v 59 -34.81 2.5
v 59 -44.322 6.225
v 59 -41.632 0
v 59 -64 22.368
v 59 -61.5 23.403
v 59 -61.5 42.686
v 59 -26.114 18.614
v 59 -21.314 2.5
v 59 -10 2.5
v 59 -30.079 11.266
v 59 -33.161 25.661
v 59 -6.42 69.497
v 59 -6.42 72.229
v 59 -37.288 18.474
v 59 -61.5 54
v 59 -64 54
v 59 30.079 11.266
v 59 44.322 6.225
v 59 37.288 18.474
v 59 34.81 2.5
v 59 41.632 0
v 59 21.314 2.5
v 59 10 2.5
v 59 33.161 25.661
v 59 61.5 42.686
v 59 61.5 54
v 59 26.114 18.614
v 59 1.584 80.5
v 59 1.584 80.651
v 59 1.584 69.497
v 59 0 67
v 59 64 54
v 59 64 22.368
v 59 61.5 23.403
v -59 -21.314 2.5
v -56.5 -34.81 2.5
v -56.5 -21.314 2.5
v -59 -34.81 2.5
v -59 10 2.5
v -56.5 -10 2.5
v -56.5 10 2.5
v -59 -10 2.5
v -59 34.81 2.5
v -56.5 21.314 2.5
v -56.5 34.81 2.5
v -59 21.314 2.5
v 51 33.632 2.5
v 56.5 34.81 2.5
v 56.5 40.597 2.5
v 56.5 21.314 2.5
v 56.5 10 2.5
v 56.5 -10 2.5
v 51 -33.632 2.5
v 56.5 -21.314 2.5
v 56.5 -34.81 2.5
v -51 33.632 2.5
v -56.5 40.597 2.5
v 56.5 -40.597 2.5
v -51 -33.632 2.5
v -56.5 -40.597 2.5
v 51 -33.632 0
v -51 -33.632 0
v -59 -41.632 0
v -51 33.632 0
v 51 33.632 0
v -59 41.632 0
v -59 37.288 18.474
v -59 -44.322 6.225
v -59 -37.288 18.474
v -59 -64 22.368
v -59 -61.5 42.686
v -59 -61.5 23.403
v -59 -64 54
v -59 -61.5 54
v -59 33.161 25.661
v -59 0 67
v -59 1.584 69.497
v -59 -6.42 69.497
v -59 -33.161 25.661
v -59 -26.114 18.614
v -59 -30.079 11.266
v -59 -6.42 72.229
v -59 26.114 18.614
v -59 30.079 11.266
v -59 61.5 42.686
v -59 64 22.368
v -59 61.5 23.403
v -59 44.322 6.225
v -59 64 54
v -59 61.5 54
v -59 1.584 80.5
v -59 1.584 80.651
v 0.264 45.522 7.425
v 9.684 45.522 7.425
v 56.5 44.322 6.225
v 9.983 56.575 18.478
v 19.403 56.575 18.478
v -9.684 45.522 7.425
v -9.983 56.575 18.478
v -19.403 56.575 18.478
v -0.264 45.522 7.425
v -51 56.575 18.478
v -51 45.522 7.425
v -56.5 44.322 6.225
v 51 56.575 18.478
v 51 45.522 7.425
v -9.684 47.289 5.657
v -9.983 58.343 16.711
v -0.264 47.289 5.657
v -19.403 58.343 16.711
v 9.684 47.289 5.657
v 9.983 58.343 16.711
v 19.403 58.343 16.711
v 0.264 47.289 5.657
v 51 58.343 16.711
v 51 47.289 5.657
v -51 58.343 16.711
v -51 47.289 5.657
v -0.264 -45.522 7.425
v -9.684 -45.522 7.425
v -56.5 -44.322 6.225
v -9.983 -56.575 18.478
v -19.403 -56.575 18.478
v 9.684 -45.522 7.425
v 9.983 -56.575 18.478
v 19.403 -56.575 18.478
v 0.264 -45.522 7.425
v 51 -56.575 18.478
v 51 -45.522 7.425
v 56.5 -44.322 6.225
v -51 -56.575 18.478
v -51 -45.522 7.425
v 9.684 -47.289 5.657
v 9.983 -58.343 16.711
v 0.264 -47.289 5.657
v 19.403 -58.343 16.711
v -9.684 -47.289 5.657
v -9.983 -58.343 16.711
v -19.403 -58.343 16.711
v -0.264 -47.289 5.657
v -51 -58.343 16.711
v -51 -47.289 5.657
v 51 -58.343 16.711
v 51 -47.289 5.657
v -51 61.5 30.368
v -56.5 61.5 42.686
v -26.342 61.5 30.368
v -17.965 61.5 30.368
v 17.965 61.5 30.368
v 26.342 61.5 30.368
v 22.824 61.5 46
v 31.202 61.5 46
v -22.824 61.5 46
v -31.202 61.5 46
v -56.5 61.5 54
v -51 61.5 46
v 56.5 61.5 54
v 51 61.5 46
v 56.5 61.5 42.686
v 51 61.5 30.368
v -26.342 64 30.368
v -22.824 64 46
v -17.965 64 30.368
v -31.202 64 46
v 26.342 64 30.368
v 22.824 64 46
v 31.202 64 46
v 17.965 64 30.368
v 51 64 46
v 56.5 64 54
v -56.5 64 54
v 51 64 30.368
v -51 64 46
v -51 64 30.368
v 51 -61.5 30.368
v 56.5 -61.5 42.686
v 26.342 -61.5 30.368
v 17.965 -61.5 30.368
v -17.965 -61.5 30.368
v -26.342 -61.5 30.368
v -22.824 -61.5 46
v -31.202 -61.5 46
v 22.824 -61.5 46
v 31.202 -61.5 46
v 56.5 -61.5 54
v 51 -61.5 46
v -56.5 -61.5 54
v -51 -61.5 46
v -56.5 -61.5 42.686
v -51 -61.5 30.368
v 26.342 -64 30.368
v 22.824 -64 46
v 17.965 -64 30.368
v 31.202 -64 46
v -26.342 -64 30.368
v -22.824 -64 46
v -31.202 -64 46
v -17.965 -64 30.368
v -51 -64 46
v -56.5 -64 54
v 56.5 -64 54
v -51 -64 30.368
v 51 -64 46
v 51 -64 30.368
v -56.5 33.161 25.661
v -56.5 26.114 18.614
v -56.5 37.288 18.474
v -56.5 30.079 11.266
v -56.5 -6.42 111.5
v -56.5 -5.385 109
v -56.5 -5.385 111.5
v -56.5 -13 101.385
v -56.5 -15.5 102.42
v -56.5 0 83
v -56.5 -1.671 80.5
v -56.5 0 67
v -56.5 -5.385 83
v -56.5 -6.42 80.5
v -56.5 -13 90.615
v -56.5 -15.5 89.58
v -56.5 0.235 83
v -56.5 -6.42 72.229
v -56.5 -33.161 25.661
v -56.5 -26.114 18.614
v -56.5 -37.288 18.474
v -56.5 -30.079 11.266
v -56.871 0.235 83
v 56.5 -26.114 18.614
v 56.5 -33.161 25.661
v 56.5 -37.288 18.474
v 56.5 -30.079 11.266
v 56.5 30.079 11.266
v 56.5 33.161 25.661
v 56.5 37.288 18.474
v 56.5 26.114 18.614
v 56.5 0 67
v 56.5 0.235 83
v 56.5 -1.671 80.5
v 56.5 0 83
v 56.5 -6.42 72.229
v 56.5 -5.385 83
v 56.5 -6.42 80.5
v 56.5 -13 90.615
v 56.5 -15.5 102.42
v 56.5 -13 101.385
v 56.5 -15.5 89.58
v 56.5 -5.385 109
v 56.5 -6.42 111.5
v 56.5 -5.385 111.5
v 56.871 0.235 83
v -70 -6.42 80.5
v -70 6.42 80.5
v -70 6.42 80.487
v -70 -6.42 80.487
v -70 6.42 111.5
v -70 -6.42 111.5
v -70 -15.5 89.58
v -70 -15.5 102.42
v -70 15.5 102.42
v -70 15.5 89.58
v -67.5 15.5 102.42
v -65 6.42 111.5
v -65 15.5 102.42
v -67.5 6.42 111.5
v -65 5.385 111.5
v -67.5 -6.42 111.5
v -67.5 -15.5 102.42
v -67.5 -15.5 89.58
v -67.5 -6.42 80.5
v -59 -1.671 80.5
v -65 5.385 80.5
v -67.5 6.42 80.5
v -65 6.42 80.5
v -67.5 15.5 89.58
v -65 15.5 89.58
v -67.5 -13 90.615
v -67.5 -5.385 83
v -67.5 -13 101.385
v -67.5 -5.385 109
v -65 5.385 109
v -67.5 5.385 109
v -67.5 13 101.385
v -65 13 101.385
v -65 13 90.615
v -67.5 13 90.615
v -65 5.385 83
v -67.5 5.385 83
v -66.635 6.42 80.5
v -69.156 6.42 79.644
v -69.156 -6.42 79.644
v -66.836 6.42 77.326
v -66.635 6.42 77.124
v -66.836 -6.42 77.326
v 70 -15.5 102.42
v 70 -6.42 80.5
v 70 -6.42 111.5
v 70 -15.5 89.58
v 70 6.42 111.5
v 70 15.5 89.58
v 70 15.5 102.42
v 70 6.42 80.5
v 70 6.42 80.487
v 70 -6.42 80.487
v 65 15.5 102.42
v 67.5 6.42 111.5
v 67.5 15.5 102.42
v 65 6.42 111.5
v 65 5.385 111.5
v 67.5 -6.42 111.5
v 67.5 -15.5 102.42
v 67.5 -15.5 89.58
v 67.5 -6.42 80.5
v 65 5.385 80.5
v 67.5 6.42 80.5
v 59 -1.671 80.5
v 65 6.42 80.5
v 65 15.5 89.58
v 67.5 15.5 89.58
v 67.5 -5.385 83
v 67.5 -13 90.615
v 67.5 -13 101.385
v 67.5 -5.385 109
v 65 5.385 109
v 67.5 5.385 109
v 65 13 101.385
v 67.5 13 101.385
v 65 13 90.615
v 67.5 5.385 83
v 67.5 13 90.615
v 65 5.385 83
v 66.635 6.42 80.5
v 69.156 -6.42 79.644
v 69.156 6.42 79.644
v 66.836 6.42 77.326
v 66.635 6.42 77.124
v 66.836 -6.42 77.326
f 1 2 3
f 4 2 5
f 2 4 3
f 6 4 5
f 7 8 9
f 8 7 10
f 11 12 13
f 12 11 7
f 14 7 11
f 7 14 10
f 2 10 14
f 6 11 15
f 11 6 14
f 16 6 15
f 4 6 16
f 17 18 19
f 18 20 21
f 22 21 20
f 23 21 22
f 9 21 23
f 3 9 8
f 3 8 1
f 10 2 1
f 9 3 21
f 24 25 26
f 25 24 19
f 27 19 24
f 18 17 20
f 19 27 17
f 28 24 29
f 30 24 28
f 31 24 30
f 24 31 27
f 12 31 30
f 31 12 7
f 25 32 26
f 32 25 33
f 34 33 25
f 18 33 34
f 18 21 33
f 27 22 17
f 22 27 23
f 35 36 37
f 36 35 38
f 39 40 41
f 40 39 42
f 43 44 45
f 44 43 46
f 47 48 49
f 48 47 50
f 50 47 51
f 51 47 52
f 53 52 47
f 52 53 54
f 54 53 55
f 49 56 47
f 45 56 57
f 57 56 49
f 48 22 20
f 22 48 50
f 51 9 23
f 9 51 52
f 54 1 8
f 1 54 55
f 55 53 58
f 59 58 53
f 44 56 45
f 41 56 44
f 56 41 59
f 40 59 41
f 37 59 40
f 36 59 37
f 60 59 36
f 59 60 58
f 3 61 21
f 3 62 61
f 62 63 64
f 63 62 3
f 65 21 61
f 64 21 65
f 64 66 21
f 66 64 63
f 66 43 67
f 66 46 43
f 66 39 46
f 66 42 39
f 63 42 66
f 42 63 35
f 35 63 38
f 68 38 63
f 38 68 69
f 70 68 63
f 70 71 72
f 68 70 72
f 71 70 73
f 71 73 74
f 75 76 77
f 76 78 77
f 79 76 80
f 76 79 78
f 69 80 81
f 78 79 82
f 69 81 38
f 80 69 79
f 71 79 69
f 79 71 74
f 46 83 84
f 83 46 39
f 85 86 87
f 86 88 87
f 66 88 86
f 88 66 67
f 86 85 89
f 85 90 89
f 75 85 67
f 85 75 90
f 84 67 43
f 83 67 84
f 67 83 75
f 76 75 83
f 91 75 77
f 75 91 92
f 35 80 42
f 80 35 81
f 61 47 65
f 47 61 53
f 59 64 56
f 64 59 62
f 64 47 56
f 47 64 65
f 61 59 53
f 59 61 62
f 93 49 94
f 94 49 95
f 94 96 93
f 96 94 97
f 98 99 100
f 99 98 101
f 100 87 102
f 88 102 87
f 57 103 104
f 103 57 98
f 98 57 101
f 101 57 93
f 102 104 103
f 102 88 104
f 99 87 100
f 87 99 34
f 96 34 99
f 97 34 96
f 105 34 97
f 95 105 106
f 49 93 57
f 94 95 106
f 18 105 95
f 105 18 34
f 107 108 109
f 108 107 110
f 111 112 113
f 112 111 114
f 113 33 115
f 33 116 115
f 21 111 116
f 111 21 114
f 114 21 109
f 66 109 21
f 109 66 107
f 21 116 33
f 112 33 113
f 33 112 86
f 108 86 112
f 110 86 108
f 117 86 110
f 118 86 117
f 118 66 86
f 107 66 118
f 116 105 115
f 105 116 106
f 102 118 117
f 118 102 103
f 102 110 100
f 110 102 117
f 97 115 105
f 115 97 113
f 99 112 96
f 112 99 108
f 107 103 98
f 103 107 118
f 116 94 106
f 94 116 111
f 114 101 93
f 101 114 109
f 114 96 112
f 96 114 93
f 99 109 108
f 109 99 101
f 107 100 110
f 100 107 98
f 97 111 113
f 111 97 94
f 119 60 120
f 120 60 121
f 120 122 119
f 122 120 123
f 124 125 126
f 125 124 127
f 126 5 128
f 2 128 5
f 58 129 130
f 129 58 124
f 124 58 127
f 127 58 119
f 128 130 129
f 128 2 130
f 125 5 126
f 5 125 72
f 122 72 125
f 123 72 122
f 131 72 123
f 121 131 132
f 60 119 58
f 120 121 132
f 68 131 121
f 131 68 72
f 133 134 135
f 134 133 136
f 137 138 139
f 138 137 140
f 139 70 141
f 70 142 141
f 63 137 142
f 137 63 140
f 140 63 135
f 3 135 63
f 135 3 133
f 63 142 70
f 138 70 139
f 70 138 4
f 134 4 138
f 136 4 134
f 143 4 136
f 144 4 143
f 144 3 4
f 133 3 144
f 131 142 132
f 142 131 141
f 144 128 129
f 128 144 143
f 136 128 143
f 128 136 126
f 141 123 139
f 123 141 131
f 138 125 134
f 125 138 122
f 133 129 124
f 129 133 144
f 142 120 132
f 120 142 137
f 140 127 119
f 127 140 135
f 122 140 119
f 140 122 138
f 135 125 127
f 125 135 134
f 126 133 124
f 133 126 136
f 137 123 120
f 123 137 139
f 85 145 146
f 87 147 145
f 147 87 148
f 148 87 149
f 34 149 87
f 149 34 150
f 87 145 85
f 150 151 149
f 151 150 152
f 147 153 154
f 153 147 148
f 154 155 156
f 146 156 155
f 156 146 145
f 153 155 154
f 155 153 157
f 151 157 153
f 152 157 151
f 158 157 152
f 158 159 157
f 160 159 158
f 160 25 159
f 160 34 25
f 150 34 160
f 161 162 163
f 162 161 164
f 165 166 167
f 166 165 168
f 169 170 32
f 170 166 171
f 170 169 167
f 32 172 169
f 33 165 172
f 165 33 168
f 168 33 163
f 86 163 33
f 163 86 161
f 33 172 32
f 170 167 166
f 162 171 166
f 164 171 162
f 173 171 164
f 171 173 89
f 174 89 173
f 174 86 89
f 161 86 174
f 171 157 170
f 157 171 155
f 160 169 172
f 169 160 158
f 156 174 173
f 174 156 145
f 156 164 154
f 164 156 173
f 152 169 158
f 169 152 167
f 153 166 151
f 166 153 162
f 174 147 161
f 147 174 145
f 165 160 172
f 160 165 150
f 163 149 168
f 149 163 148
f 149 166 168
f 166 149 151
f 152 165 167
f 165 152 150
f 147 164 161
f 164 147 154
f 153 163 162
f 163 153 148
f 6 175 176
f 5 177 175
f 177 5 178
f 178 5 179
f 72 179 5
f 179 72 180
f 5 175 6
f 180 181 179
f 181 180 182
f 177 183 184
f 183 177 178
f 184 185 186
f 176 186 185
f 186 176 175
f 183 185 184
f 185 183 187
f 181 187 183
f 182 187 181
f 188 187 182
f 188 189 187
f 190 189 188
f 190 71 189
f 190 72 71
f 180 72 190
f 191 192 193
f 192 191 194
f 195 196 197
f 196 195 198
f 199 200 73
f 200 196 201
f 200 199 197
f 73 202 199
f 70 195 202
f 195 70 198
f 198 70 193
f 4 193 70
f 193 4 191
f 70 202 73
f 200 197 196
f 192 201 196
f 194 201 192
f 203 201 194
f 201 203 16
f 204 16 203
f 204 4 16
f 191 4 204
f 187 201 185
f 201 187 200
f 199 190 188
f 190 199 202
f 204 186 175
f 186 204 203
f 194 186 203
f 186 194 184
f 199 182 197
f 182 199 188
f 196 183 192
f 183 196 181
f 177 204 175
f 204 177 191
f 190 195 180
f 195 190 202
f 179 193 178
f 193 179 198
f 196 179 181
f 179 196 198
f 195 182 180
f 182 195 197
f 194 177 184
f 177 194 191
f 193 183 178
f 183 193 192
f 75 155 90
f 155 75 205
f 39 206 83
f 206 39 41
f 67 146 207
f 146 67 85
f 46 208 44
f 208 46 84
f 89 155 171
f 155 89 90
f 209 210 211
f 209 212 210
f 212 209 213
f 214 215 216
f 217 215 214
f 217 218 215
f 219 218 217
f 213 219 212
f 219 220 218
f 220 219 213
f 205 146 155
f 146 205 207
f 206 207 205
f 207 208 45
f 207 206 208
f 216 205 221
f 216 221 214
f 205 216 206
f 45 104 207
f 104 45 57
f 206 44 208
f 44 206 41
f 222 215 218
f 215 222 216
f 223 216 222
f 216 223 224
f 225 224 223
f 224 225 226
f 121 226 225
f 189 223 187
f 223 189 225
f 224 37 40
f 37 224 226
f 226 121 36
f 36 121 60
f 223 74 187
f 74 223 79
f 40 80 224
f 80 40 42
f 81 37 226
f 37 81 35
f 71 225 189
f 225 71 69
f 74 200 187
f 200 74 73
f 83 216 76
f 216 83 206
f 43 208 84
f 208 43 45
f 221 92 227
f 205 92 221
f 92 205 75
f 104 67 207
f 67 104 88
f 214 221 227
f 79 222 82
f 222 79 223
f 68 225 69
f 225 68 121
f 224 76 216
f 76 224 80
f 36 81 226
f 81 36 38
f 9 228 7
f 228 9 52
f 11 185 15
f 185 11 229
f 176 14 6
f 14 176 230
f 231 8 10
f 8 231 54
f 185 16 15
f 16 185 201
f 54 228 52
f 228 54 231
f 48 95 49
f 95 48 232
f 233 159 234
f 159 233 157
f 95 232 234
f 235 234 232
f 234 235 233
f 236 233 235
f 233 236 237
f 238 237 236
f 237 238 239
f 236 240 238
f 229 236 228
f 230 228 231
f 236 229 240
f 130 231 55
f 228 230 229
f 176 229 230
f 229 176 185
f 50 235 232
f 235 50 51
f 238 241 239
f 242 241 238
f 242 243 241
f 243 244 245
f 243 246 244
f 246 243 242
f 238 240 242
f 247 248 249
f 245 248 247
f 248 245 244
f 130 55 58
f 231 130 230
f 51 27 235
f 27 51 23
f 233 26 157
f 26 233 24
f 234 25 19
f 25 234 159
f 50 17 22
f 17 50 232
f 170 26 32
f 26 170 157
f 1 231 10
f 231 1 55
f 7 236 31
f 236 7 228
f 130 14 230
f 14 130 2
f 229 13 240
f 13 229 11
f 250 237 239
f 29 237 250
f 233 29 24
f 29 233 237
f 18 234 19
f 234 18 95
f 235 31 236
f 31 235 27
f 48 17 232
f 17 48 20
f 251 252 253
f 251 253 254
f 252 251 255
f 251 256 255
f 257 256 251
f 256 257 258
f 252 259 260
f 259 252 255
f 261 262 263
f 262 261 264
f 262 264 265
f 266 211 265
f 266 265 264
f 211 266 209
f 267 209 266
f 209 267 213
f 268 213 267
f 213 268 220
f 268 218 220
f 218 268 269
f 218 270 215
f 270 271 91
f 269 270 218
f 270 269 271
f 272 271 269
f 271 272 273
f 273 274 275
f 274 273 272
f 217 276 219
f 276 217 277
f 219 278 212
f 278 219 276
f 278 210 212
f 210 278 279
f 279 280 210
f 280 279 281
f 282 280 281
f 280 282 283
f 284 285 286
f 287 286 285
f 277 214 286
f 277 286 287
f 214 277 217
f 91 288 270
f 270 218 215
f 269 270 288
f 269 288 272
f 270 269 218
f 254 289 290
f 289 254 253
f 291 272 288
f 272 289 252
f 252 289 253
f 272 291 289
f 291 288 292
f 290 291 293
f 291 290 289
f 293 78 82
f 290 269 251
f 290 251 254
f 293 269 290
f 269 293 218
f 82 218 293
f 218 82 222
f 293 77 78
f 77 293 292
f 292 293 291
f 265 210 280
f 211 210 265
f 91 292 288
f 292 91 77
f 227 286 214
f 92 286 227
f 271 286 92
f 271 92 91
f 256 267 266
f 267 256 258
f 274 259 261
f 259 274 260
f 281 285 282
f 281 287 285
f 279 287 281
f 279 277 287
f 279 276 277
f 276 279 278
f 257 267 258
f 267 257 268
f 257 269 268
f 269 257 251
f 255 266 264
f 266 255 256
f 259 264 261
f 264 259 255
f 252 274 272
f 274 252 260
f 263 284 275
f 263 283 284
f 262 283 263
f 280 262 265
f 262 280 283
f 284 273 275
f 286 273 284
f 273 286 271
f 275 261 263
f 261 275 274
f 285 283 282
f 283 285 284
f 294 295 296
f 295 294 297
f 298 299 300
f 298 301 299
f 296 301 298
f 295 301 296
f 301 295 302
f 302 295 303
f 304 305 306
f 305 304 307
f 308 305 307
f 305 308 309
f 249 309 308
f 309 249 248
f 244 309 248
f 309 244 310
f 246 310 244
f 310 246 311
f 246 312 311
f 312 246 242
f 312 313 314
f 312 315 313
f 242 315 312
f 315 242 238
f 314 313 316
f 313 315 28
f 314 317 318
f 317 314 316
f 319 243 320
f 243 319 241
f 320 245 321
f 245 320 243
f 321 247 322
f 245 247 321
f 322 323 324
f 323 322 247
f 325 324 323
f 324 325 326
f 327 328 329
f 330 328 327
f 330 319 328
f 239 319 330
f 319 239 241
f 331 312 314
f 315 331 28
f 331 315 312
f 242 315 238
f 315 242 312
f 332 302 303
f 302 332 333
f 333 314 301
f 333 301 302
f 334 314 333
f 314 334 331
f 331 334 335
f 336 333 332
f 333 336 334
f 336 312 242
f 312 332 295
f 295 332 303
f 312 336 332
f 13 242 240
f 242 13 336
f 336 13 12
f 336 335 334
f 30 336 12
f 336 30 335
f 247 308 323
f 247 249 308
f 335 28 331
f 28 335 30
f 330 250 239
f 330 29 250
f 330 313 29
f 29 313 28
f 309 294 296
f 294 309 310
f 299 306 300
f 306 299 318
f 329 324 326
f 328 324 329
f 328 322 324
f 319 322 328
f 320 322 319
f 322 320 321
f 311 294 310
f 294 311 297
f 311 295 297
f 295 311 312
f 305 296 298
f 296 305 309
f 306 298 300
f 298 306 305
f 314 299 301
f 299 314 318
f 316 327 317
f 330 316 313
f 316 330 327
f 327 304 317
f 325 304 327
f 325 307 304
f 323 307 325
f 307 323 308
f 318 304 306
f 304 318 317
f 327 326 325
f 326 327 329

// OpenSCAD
/*
 * CC BY-NC 4.0
 * https://creativecommons.org/licenses/by-nc/4.0/
 *
 * Author: Kevin Lam (kevinlam@bbs2.hk)
 *
 */

/* setup */
part = "holder"; // [holder: Holder, bar: Bar holding the roll]

width = 118;
height = 128;

// excluding the arms
depth = 54;

// this affect the strength of the frame
thickness = 2.5;
// this affect the width at the sides of the frame
padding = 8;

// Distance from the bar to the back, i.e., radius of a toilet paper roll
bar_z = 96;

// this is the width of the bar holding the roll, must be larger than width
bar_width = 135;
bar_diameter = 26;  // diameter of bar


module base() {
    slanted_size = min(height/4, depth*cos(45)/(1+cos(45)));
    slanted_height = slanted_size/cos(45);

    translate([0,0,thickness/2]) {
        difference() {
            cube([width, height-slanted_size*2, thickness], center=true);
            cube([width-padding*2, height-slanted_size*2-padding*2, thickness*2], center=true);
        };
    };
}

module slanted() {
    slanted_size = min(height/4, depth*cos(45)/(1+cos(45)));
    slanted_height = slanted_size/cos(45);
    
    support_angle = atan2(width/6, slanted_height);
    support_width = padding/cos(support_angle);

    translate([0, height/2-slanted_size/2-thickness/2*cos(45), thickness/2*cos(45)+slanted_size/2])
    rotate(45, [1,0,0]) {
        difference() {
            cube([width, slanted_height, thickness], center=true);
            cube([width-padding*2, slanted_height-padding*2, thickness*2], center=true);
        }
        translate([0,0,-thickness/2])
        linear_extrude(thickness) {
            polygon([
                [support_width/2, -slanted_height/2],
                [width/6+support_width/2, slanted_height/2],
                [width/6-support_width/2, slanted_height/2],
                [-support_width/2, -slanted_height/2]
            ]);
            polygon([
                [support_width/2, -slanted_height/2],
                [-width/6+support_width/2, slanted_height/2],
                [-width/6-support_width/2, slanted_height/2],
                [-support_width/2, -slanted_height/2]
            ]);
        }
    };
}

module top() {
    slanted_size = min(height/4, depth*cos(45)/(1+cos(45)));
    slanted_height = slanted_size/cos(45);
    top_height = depth - slanted_size;
    
    support_angle = atan2(width/4-width/6, top_height);
    support_width = padding/cos(support_angle);


    translate([0, height/2-thickness/2, depth-top_height/2])
    rotate(90, [1,0,0]) {

        difference() {
            cube([width, top_height, thickness], center=true);
            cube([width-padding*2, top_height-padding*2, thickness*2], center=true);
        };

        translate([0,0,-thickness/2])
        linear_extrude(thickness) {
            polygon([
                [width/6+support_width/2, -slanted_height/2],
                [width/4+support_width/2, slanted_height/2],
                [width/4-support_width/2, slanted_height/2],
                [width/6-support_width/2, -slanted_height/2]
            ]);
            polygon([
                [-width/6+support_width/2, -slanted_height/2],
                [-width/4+support_width/2, slanted_height/2],
                [-width/4-support_width/2, slanted_height/2],
                [-width/6-support_width/2, -slanted_height/2]
            ]);
        }
    }    
}

module side() {
    holder_length = (bar_width - width)/2+thickness*2;
    holder_inner_radius = (bar_diameter/2)/cos(360/16);
    
    top_inner = bar_z - bar_diameter/2 - thickness - holder_length;
    slanted_size = min(height/4, depth*cos(45)/(1+cos(45)));
    slanted_height = slanted_size/cos(45);
    side_center = height/2-slanted_size-thickness/tan(67.5);
    
    
    // solving equation to find positions
    _a = top_inner - thickness;
    _b = side_center;
    
    A = 4*_a*_a-padding*padding;
    B = 2*_b*padding*padding;
    C = -(_a*_a+_b*_b)*padding*padding;
    
    D = sqrt(B*B - 4*A * C);
        
    y = (-B+D) / 2 / A;
    x = sqrt(1/(4 / padding / padding - 1/y/y));
    
    angle = atan2(x,y);
    
    translate([-width/2+thickness,0,0])
    rotate(-90, [0,1,0])
    rotate(-90, [0,0,1]) {
        linear_extrude(thickness) {
            polygon([
                [-height/2, depth],
                [-height/2+thickness, depth],
                [-height/2+thickness+depth, 0],
                [-height/2+thickness+depth-padding/cos(45), 0],
                [-height/2, depth-padding/cos(45)+thickness],
            ]);
        }
    }
    translate([-width/2+thickness,0,0])
    mirror([0,1,0])
    rotate(-90, [0,1,0])
    rotate(-90, [0,0,1]) {
        linear_extrude(thickness) {
            polygon([
                [-height/2, depth],
                [-height/2+thickness, depth],
                [-height/2+thickness+depth, 0],
                [-height/2+thickness+depth-padding/cos(45), 0],
                [-height/2, depth-padding/cos(45)+thickness],
            ]);
        }
    }
       
    translate([-width/2,0,thickness])
    rotate(90, [0,0,1])
    rotate(90, [1,0,0])
    linear_extrude(thickness) {
        difference() {
            polygon([
                [0, top_inner-thickness],
                [side_center-padding/2/sin(angle), -padding/2/tan(angle)],
                [side_center,-padding/2/tan(angle)],
                [side_center+padding/2/sin(angle), padding/2/tan(angle)],
                [0, top_inner+x*2-thickness],
                [-(side_center+padding/2/sin(angle)), padding/2/tan(angle)],
                [-side_center,-padding/2/tan(angle)],
                [-(side_center-padding/2/sin(angle)), -padding/2/tan(angle)],
            ]);
            translate([0,bar_z-thickness])
            rotate(360/16)
                circle(holder_inner_radius, $fn=8);
        }
    }
}

module holder_main() {
    holder_length = (bar_width - width)/2+thickness*2;
    holder_side = 2*(bar_diameter/2+thickness)*tan(360/16);
    holder_inner_radius = (bar_diameter/2)/cos(360/16);
    holder_radius = (bar_diameter/2+thickness)/cos(360/16);
    
    linear_extrude(thickness)
    rotate(360/16)
        circle(holder_radius, $fn=8);
    
    difference() {
        union() {
            rotate(360/16)
            linear_extrude(holder_length)
            difference() {
                circle(holder_radius, $fn=8);
                circle(holder_inner_radius, $fn=8);
            };
            translate([0,-bar_diameter/2-thickness, holder_length])
            rotate(180, [0,1,0])
            linear_extrude(holder_length, scale=[1,0.001])
            translate([-holder_side/2,-holder_length])
                square([holder_side, holder_length]);
        }
        
        translate([-holder_side/2+thickness*tan(360/16),0,holder_length]) 
        rotate(atan2(holder_length-thickness*2, holder_side-2*thickness*tan(360/16)), [0,1,0])
            cube(bar_diameter*4);
        
        translate([0,-bar_diameter*4,holder_length]) 
        rotate(atan2(holder_length-thickness*2, holder_side/2-thickness*tan(360/16)), [0,1,0])
            cube(bar_diameter*4);

    };
   
    rotate(360/16)
    linear_extrude(thickness*2)
    difference() {
        circle(holder_radius, $fn=8);
        circle(holder_inner_radius, $fn=8);
    };
}

module holder_arm() {
    holder_length = (bar_width - width)/2+thickness*2;
    holder_inner_radius = (bar_diameter/2)/cos(360/16);
    
    top_inner = bar_z - bar_diameter/2 - thickness - holder_length;
    side_center = height/4-thickness/tan(67.5);
    
    
    // solving equation to find positions
    _a = top_inner - thickness;
    _b = side_center;
    
    A = 4*_a*_a-padding*padding;
    B = 2*_b*padding*padding;
    C = -(_a*_a+_b*_b)*padding*padding;
    
    D = sqrt(B*B - 4*A * C);
        
    y = (-B+D) / 2 / A;
    x = sqrt(1/(4 / padding / padding - 1/y/y));
    
    angle = atan2(x,y);
    
        
    translate([-width/2,0,thickness])
    rotate(90, [0,0,1])
    rotate(90, [1,0,0])
    linear_extrude(thickness) {
        difference() {
            polygon([
                [0, top_inner-thickness],
                [side_center-padding/2/sin(angle), -padding/2/tan(angle)],
                [side_center+padding/2/sin(angle), padding/2/tan(angle)],
                [0, top_inner+x*2-thickness],
                [0, top_inner+x*2-thickness],
                [-(side_center+padding/2/sin(angle)), padding/2/tan(angle)],
                [-(side_center-padding/2/sin(angle)), -padding/2/tan(angle)],
            ]);
            translate([0,bar_z-thickness])
            rotate(360/16)
                circle(holder_inner_radius, $fn=8);
        }
    }
}

module holder_one() {
    holder_length = (bar_width - width)/2+thickness*2;

    translate([-holder_length-width/2+thickness,0,bar_z])
    rotate(90, [0,0,1])
    rotate(90, [1,0,0])
        holder_main();
    
}

module holder() {
    base();

    slanted();
    rotate(180) slanted();

    top();
    rotate(180) top();
    
    side();
    rotate(180) side();

    holder_one();
    mirror([1,0,0]) holder_one();
   
}

module bar() {
    cylinder(bar_width/2, bar_diameter/2, bar_diameter/2*0.9);
    translate([0,0,bar_width])
    rotate(180, [0,1,0])
        cylinder(bar_width/2, bar_diameter/2, bar_diameter/2*0.9);
}


// I like it this way :D
$fn = 64;

print_part();

module print_part() {
	if (part == "holder") {
        holder();
	} else if (part == "bar") {
        bar();
	}
}
